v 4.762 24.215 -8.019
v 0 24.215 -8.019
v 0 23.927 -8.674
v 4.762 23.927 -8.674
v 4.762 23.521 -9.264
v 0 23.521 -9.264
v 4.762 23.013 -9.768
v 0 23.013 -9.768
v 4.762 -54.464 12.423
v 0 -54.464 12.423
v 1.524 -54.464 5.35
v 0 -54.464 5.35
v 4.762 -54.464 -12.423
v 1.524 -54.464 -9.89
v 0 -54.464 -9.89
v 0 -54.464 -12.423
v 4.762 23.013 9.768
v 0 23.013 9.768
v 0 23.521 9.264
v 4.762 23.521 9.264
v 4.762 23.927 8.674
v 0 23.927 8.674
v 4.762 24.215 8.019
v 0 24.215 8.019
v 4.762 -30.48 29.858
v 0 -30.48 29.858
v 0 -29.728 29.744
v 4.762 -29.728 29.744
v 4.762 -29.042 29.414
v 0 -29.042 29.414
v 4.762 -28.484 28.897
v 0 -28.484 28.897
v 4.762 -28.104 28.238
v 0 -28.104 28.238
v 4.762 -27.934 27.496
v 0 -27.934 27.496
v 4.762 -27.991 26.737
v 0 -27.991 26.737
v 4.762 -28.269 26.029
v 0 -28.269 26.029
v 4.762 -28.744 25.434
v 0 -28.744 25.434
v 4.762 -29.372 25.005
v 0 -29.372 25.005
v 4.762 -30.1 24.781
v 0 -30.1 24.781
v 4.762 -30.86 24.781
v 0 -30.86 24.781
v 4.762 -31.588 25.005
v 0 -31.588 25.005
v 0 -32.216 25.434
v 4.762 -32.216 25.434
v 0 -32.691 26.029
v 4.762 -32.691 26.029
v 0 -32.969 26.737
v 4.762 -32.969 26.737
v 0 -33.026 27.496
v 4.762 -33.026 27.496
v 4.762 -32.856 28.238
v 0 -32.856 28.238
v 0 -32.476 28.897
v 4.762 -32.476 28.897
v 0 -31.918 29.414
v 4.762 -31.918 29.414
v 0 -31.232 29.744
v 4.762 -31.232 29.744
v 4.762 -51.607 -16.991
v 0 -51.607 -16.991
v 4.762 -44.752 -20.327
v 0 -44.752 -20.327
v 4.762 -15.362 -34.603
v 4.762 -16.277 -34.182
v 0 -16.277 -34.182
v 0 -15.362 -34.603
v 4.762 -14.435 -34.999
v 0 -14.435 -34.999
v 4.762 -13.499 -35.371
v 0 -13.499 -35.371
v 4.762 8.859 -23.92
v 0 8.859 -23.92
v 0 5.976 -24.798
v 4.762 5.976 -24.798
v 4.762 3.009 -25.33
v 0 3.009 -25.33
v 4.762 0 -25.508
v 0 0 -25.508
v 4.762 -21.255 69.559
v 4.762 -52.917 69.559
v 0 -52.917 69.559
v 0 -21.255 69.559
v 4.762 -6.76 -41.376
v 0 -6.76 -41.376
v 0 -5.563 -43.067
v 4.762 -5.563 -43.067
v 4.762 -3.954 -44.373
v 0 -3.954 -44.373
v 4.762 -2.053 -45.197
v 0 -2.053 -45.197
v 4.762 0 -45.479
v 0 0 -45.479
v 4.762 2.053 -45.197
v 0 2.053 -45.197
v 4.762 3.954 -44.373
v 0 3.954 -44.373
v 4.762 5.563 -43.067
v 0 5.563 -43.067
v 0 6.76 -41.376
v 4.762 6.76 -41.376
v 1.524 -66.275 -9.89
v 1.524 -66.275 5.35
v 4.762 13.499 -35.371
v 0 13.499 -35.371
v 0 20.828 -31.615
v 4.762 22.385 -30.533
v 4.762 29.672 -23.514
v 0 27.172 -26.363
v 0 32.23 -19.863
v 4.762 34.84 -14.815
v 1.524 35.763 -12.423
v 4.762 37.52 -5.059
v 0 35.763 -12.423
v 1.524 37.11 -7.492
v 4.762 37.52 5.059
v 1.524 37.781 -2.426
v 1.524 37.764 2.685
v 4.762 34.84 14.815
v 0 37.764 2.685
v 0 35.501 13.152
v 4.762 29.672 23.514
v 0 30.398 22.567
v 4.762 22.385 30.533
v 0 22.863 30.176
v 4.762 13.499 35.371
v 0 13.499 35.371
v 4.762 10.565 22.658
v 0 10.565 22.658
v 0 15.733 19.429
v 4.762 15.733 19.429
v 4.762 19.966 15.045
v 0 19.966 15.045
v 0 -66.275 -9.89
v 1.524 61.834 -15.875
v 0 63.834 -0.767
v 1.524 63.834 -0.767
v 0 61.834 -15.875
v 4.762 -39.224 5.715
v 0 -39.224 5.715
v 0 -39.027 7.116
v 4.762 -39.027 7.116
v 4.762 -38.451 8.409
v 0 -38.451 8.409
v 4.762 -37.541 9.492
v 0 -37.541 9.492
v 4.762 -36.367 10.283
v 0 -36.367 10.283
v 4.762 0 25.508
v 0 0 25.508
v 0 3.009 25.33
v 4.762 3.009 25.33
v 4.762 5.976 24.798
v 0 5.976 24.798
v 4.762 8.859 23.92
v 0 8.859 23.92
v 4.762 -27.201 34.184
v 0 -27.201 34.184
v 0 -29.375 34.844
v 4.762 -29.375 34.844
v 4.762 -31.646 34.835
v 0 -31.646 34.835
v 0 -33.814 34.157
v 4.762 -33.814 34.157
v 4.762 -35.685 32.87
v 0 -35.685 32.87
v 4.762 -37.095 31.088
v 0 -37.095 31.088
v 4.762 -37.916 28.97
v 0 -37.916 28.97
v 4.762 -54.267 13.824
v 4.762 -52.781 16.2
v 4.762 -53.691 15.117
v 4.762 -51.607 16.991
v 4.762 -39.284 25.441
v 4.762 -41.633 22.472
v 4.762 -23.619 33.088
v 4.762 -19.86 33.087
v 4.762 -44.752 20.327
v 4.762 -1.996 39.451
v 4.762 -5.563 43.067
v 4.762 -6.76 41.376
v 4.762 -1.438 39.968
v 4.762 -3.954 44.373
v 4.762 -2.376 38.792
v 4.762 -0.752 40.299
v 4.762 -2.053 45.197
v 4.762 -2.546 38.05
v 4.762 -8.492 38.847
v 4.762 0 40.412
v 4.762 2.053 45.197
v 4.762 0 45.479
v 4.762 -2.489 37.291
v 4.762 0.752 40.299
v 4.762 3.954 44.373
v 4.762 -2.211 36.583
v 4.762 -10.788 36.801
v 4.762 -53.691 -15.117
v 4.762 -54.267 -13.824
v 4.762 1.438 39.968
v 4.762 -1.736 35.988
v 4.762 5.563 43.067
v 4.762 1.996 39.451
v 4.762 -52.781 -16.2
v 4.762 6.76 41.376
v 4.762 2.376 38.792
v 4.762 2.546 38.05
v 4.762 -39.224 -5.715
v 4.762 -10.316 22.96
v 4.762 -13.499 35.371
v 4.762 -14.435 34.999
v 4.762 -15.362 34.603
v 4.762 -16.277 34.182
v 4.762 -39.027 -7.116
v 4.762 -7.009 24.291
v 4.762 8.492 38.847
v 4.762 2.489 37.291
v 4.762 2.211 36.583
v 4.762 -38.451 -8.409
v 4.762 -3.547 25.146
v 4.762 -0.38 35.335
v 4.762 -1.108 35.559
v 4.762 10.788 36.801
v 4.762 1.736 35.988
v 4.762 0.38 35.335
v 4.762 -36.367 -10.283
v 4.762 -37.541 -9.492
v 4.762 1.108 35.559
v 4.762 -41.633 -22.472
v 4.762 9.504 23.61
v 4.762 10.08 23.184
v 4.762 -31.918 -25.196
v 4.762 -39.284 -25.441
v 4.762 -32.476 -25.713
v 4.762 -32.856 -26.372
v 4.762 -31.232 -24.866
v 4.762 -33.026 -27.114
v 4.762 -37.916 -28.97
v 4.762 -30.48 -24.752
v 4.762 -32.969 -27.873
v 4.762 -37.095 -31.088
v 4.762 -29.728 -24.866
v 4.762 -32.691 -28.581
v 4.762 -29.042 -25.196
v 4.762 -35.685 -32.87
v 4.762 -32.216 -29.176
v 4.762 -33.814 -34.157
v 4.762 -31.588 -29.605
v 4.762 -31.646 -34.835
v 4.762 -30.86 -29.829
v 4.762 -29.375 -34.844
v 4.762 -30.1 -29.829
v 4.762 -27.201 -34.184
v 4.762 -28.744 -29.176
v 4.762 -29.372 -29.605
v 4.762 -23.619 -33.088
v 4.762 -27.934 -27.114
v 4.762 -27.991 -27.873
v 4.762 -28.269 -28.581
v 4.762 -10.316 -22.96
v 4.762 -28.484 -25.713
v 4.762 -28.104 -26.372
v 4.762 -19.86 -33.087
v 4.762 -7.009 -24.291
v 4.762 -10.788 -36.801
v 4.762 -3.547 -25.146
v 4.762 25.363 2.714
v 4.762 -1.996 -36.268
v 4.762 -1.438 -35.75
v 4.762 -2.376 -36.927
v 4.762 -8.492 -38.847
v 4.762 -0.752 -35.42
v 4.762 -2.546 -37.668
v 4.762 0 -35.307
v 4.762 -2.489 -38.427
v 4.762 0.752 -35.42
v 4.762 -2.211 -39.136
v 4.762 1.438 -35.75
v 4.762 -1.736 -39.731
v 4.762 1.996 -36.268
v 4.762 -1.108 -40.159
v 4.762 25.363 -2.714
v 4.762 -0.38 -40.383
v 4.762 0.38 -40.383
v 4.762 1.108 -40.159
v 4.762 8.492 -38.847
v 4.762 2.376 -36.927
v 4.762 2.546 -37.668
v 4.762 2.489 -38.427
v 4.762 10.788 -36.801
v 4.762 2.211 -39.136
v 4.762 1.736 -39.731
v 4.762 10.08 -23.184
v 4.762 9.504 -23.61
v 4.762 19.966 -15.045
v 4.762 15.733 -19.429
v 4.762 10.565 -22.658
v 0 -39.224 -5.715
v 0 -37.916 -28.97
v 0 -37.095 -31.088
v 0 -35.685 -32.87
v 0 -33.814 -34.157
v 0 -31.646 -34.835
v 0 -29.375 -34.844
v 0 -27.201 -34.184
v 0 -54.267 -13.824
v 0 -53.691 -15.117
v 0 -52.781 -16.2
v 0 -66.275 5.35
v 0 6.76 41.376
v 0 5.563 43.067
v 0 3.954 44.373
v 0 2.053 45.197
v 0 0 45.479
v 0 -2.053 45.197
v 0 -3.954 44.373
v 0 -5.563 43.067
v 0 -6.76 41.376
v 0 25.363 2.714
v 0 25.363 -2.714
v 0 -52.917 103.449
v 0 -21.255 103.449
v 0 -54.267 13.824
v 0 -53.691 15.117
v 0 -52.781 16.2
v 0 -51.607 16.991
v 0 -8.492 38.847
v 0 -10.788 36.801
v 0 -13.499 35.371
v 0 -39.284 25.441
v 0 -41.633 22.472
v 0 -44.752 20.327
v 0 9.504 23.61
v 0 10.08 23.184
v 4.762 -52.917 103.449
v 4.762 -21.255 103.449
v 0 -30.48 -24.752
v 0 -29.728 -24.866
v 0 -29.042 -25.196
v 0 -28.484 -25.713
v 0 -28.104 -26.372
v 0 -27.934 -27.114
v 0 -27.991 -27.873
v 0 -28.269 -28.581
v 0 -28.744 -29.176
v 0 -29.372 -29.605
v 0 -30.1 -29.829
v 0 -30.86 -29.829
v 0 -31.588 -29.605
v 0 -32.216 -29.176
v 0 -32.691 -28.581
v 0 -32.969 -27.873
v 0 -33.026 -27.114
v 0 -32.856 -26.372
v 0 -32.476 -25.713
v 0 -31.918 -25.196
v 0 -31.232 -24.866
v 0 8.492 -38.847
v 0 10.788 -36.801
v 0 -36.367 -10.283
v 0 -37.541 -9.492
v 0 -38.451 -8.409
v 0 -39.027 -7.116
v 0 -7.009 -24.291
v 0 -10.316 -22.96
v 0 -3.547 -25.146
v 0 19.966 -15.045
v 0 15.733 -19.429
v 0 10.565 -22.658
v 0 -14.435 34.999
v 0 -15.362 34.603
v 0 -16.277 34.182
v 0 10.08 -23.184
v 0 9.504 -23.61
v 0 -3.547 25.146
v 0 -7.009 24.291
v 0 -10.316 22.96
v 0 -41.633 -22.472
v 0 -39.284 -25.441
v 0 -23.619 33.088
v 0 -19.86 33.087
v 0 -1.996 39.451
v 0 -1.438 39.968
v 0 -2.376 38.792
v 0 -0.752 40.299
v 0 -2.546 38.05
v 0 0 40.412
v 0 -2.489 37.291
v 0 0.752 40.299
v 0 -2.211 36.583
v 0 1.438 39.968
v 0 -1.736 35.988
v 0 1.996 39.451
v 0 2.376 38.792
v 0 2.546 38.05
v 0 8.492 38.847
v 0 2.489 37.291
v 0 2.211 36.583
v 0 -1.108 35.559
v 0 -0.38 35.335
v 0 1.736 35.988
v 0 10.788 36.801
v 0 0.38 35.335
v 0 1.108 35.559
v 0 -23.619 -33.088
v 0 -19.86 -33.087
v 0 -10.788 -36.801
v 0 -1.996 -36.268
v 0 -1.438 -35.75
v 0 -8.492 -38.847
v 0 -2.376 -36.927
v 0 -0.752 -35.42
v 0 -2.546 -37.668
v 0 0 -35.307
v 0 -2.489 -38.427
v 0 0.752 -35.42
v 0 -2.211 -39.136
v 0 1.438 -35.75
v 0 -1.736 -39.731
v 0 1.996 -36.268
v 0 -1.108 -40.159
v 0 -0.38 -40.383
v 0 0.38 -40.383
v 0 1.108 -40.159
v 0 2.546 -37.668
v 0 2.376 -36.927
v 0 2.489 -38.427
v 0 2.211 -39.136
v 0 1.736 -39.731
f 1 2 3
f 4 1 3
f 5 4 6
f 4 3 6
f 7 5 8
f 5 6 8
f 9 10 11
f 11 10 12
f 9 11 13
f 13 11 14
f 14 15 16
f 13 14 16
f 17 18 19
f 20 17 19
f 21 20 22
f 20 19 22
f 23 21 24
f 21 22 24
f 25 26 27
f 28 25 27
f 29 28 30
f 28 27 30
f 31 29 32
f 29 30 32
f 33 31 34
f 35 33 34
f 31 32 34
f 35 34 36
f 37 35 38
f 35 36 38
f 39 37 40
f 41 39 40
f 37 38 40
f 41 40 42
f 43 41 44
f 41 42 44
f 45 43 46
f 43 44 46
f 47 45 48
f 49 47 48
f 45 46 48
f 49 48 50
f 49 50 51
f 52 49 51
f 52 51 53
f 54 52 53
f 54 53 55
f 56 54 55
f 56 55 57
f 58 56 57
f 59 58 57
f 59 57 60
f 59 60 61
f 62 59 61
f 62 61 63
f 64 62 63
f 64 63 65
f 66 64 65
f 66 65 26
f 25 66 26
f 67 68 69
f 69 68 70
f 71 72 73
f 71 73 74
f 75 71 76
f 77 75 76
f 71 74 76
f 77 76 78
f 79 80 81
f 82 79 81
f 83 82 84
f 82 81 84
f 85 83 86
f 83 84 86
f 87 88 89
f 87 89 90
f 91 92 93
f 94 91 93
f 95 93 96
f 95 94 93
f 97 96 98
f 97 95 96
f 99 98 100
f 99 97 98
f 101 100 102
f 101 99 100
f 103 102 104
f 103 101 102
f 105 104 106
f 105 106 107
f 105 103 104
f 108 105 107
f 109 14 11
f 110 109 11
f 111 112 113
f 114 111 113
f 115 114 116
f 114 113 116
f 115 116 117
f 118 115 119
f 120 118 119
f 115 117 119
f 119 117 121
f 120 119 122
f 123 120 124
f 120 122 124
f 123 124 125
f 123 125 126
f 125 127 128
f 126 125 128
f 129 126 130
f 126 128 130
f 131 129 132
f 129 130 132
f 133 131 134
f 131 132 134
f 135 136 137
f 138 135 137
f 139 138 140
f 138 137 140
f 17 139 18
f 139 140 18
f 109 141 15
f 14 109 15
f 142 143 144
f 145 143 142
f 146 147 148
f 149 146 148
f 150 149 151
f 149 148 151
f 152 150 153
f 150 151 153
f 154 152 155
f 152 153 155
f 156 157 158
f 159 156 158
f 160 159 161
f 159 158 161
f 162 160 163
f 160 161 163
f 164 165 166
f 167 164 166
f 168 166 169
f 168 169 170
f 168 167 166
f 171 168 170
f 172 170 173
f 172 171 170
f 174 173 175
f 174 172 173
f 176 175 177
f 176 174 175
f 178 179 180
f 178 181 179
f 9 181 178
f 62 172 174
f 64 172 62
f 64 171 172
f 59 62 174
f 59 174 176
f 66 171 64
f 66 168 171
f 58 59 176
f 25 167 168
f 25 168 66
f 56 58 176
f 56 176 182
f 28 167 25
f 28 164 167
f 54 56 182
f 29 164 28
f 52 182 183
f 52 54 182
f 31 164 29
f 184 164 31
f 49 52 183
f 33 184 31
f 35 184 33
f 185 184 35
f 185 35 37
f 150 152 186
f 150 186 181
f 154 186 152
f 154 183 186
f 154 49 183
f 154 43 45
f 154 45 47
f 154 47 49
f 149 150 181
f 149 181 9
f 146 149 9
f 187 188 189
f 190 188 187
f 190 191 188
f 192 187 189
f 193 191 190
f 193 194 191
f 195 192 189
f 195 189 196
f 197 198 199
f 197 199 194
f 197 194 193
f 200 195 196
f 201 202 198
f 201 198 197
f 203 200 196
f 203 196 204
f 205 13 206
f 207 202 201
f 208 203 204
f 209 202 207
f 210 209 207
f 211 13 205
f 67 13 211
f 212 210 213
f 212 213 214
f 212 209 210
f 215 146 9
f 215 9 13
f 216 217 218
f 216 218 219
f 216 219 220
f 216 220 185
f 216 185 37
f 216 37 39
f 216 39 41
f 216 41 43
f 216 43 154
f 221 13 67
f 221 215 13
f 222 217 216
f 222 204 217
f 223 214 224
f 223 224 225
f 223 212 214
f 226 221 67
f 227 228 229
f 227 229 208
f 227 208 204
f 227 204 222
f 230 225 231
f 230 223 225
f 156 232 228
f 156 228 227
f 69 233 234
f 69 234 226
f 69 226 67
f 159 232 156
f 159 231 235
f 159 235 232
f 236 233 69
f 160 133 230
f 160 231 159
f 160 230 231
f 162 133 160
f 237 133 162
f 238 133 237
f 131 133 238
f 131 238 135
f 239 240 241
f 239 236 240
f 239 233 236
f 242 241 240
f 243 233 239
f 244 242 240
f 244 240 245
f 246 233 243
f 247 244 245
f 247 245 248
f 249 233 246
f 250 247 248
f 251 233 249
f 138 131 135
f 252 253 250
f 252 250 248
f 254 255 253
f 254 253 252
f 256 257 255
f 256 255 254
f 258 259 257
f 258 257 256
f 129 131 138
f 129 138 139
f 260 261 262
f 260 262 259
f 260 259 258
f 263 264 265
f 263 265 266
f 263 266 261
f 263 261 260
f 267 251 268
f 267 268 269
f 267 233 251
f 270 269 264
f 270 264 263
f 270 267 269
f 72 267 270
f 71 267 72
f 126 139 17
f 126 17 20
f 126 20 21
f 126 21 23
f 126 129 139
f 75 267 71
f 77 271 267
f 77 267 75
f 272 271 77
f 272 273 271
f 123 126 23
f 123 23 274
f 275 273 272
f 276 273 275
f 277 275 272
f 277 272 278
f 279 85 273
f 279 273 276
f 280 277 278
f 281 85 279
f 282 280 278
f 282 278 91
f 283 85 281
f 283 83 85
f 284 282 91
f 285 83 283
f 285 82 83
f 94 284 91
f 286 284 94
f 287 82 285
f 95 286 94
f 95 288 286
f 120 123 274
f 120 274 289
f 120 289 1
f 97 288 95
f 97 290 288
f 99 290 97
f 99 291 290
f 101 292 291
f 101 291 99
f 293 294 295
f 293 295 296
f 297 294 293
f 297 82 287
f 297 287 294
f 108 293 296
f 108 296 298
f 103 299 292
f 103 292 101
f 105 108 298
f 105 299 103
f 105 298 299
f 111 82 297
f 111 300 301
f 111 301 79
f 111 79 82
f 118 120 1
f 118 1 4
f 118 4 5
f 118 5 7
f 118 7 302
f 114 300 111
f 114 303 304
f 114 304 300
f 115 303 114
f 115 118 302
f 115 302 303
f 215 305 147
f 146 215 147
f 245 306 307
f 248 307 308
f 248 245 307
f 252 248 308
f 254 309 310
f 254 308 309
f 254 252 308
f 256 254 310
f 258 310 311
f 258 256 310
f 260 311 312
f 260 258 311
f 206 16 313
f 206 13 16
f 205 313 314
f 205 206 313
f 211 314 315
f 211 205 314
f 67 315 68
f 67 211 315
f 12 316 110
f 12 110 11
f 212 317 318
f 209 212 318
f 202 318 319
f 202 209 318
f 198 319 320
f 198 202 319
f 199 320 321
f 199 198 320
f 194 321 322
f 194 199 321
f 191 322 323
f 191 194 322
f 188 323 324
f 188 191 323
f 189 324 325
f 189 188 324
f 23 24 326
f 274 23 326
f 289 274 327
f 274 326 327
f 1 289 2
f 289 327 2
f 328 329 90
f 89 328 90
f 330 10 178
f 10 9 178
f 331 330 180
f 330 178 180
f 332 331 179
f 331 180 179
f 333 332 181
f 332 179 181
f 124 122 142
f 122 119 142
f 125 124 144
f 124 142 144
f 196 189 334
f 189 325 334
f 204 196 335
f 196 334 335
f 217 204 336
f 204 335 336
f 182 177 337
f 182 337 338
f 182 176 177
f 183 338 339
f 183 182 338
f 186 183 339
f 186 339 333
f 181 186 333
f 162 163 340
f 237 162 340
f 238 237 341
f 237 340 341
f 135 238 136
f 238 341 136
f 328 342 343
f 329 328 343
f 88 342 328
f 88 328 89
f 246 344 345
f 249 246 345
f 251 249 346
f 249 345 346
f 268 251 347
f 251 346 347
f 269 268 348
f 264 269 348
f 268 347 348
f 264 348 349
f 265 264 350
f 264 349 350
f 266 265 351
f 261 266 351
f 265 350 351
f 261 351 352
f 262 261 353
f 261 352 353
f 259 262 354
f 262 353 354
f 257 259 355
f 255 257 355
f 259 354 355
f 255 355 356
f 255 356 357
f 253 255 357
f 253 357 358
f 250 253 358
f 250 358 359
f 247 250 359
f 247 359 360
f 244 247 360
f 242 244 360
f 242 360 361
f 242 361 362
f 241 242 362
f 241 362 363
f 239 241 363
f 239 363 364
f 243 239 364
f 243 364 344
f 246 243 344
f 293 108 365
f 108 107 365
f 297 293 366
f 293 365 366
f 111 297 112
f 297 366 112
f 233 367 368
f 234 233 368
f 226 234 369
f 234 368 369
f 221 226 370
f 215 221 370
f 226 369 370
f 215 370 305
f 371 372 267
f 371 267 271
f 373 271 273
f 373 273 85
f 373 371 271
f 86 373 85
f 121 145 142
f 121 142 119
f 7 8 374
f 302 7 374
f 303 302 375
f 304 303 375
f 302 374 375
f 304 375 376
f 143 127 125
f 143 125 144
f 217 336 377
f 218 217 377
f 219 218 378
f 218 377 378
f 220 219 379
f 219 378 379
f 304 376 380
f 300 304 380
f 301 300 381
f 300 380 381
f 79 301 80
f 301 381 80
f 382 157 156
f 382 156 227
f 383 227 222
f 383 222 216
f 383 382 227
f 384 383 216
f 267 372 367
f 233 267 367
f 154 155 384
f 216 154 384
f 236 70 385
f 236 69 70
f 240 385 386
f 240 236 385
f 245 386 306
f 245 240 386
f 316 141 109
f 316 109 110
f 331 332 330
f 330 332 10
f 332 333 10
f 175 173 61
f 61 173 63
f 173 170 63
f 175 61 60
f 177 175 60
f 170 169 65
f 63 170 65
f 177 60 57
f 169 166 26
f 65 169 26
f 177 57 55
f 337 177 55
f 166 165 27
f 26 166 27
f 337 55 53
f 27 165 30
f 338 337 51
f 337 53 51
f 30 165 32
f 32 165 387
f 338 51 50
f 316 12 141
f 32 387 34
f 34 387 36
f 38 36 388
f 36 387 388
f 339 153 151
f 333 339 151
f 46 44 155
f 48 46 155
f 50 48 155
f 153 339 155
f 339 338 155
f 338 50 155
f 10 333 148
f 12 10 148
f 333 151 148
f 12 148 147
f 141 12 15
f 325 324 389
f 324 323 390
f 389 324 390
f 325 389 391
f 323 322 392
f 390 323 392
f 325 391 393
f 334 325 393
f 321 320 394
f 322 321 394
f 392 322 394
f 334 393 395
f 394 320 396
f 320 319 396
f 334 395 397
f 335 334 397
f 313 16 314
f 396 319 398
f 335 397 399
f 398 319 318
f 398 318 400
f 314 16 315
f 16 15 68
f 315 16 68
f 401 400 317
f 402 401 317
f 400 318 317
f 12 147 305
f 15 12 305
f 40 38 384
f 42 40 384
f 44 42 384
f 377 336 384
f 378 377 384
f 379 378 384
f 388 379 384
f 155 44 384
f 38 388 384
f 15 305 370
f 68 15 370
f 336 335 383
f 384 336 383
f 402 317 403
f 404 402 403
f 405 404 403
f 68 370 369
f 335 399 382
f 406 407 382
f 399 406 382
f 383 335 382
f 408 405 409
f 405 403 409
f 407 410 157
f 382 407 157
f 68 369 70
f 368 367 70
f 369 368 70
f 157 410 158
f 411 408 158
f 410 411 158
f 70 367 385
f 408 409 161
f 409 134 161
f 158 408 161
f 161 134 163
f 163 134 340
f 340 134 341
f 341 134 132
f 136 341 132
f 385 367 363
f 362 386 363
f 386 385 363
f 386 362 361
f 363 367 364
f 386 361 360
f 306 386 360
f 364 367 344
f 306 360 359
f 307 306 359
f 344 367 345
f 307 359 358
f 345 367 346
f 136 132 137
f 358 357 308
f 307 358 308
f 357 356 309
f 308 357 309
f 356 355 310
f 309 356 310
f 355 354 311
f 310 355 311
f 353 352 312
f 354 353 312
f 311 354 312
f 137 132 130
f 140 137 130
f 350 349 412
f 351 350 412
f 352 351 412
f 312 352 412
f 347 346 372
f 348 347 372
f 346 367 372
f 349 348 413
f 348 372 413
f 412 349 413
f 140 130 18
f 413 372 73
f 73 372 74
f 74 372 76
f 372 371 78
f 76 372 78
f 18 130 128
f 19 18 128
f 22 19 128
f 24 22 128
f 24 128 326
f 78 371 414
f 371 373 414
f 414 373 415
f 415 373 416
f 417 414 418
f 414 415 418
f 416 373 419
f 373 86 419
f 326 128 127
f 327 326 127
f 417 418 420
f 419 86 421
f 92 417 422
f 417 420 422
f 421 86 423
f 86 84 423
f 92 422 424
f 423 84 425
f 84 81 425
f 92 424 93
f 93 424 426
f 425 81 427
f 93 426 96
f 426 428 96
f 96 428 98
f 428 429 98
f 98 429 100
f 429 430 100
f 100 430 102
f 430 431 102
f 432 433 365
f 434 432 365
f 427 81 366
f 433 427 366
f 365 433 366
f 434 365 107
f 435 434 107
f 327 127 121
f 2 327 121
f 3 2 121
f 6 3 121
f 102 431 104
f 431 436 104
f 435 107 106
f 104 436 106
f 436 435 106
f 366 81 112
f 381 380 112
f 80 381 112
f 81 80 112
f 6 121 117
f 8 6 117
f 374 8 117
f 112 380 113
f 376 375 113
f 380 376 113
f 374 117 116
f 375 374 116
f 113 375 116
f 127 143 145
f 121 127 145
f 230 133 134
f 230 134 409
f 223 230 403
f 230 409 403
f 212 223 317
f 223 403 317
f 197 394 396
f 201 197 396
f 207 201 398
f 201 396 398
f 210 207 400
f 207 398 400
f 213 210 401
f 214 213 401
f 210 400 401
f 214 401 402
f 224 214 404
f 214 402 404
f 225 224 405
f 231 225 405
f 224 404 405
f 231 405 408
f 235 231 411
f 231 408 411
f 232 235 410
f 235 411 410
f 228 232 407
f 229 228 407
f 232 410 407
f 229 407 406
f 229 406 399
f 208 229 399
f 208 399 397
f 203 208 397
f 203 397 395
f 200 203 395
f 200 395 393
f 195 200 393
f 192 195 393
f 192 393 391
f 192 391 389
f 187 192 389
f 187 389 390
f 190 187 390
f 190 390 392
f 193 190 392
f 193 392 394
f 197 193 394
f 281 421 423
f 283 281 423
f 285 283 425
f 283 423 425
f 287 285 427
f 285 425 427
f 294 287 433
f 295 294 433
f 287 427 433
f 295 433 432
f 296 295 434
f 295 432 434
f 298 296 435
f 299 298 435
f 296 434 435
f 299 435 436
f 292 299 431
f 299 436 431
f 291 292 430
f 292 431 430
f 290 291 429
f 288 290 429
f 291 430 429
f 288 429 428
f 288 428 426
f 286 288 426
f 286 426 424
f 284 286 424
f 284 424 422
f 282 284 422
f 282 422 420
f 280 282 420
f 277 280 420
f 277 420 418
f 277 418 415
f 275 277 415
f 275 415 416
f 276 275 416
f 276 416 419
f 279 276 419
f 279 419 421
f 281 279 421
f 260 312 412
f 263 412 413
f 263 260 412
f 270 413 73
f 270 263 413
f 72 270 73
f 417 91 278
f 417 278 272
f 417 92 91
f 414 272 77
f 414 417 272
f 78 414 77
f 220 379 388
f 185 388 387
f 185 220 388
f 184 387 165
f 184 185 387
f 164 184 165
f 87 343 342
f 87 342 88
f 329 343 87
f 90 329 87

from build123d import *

# Parameters (mm, degrees)
BOSS_EXTRUDE1_DEPTH    = 4.7625
FILLET1_R              = 25.4
FILLET2_R              = 5.08
SKETCH2_R              = 7.62
BOSS_EXTRUDE2_DEPTH    = 4.7625
FILLET3_R              = 12.7
F_10_CLEARANCE_HOLE1_D = 5.1054
SKETCH6_W              = 33.890127471
SKETCH6_H              = 31.661537848
BOSS_EXTRUDE3_DEPTH    = 4.7625
SKETCH7_W              = 15.24
SKETCH7_H              = 11.811391345
BOSS_EXTRUDE4_DEPTH    = 1.524


with BuildPart() as part:
    # Sketch1 → Boss-Extrude1 (new body)
    with BuildSketch(Plane(origin=(0, 0, 0), x_dir=(0, 0, -1), z_dir=(1, 0, 0))):
        with BuildLine():
            Line((-15.600146512, -54.464), (15.600146512, -54.464))
            Line((15.600146512, -54.464), (34.042431289, -16.566091146))
            ThreePointArc((34.042431289, -16.566091146), (0, 37.85924595), (-34.042431289, -16.566091146))
            Line((-34.042431289, -16.566091146), (-15.600146512, -54.464))
        make_face()
        with BuildLine():
            Line((25.508, 0), (25.508, -5.08))
            Line((25.508, -5.08), (10.282855133, -36.366858404))
            ThreePointArc((10.282855133, -36.366858404), (8.408907878, -38.450885226), (5.715, -39.224))
            Line((5.715, -39.224), (-5.715, -39.224))
            ThreePointArc((-5.715, -39.224), (-8.408907878, -38.450885226), (-10.282855133, -36.366858404))
            Line((-10.282855133, -36.366858404), (-25.508, -5.08))
            Line((-25.508, -5.08), (-25.508, 0))
            ThreePointArc((-25.508, 0), (-25.107901196, 4.500151281), (-23.920156064, 8.859130762))
            ThreePointArc((-23.920156064, 8.859130762), (-23.410150406, 9.801984571), (-22.657694676, 10.565456544))
            ThreePointArc((-22.657694676, 10.565456544), (-17.366459261, 17.983495008), (-9.768278212, 23.012621336))
            ThreePointArc((-9.768278212, 23.012621336), (-8.979011, 23.737973903), (-8.018932611, 24.214763756))
            ThreePointArc((-8.018932611, 24.214763756), (0, 25.508), (8.018932611, 24.214763756))
            ThreePointArc((8.018932611, 24.214763756), (8.979011, 23.737973903), (9.768278212, 23.012621336))
            ThreePointArc((9.768278212, 23.012621336), (17.366459261, 17.983495008), (22.657694676, 10.565456544))
            ThreePointArc((22.657694676, 10.565456544), (23.410150406, 9.801984571), (23.920156064, 8.859130762))
            ThreePointArc((23.920156064, 8.859130762), (25.107901196, 4.500151281), (25.508, 0))
        make_face(mode=Mode.SUBTRACT)
    extrude(amount=BOSS_EXTRUDE1_DEPTH)

    # Fillet1
    # the kernel refuses this fillet: 25.4 mm, written as the material it adds along each edge
    with BuildSketch(Plane(origin=(0, -5.08, 25.508), x_dir=(0, -0.8991840813100413, -0.43757055193261923), z_dir=(1, 0, 0))) as fillet1_piece_1:
        with BuildLine():
            CenterArc((5.823492587, 25.4), FILLET1_R, 245.851175762, 24.148824238)
            Line((-4.567855133, 2.222858404), (-4.775682087, 1.759315572))
            ThreePointArc((-4.775682087, 1.759315572), (-2.506213407, 0.654643689), (-0.22228584, -0.456785513))
            Line((-0.22228584, -0.456785513), (0, -0.508))
            Line((0, -0.508), (5.823492587, -0.508))
            Line((5.823492587, -0.508), (5.823492587, 0))
        make_face()
    extrude(amount=4.7625)
    with BuildSketch(Plane(origin=(0, -5.08, -25.508), x_dir=(0, 1, 0), z_dir=(1, 0, 0))) as fillet1_piece_2:
        with BuildLine():
            CenterArc((5.877900188, 25.387464531), FILLET1_R, 244.051024762, 24.148824238)
            Line((-5.236391831, 2.548188865), (-5.458677672, 2.091403352))
            Line((-5.458677672, 2.091403352), (-0.22228584, -0.456785513))
            Line((-0.22228584, -0.456785513), (0, -0.508))
            ThreePointArc((0, -0.508), (2.54, -0.508), (5.064041996, -0.507749291))
            Line((5.064041996, -0.507749291), (5.08, 0))
        make_face()
    extrude(amount=4.7625)

    # Fillet2
    fillet2_edges = [part.edges().sort_by_distance(p)[0] for p in [
        (2.38125, -54.464, -15.600146512),
        (2.38125, -54.464, 15.600146512),
    ]]
    fillet(fillet2_edges, radius=FILLET2_R)

    # Sketch2 → Boss-Extrude2 (add, through all)
    with BuildSketch(Plane(origin=(4.7625, 0, 0), x_dir=(0, 0, -1), z_dir=(1, 0, 0))):
        with Locations((37.85924595, 0)):
            Circle(SKETCH2_R)
        with Locations((-37.85924595, 0)):
            Circle(SKETCH2_R)
        with Locations((-27.305, -30.48)):
            Circle(SKETCH2_R)
        with Locations((27.305, -30.48)):
            Circle(SKETCH2_R)
    extrude(amount=-BOSS_EXTRUDE2_DEPTH)

    # Fillet3
    fillet3_edges = [part.edges().sort_by_distance(p)[0] for p in [
        (2.38125, -7.581315695, -37.092400249),
        (2.38125, 7.581315695, -37.092400249),
        (2.38125, 7.581315695, 37.092400249),
        (2.38125, -7.581315695, 37.092400249),
        (2.38125, -37.318546983, -23.943649801),
        (2.38125, -23.61508868, -30.612172896),
        (2.38125, -23.61508868, 30.612172896),
        (2.38125, -37.318546983, 23.943649801),
    ]]
    fillet(fillet3_edges, radius=FILLET3_R)

    # #10 Clearance Hole1 (through all)
    with Locations(Plane(origin=(4.7625, 0, 0), x_dir=(0, 0, -1), z_dir=(1, 0, 0))):
        with Locations((-37.85924595, 0), (37.85924595, 0), (27.305, -30.48), (-27.305, -30.48)):
            Hole(F_10_CLEARANCE_HOLE1_D / 2)

    # Sketch7 → Boss-Extrude4 (add)
    with BuildSketch(Plane.ZY):
        with Locations((-2.270075224, -60.369695673)):
            Rectangle(SKETCH7_W, SKETCH7_H)
        Polygon((-12.422664108, 35.763108371), (2.685429581, 37.763884491), (-0.767111353, 63.83442351), (-15.875205043, 61.83364739), align=None)
    extrude(amount=-BOSS_EXTRUDE4_DEPTH)


with BuildPart() as body_2:
    # Sketch6 → Boss-Extrude3 (new body)
    with BuildSketch(Plane(origin=(4.7625, 0, 0), x_dir=(0, 0, -1), z_dir=(1, 0, 0))):
        with Locations((-86.503934592, -37.085978952)):
            Rectangle(SKETCH6_W, SKETCH6_H)
    extrude(amount=-BOSS_EXTRUDE3_DEPTH)


solid = Compound([part.part, body_2.part])
